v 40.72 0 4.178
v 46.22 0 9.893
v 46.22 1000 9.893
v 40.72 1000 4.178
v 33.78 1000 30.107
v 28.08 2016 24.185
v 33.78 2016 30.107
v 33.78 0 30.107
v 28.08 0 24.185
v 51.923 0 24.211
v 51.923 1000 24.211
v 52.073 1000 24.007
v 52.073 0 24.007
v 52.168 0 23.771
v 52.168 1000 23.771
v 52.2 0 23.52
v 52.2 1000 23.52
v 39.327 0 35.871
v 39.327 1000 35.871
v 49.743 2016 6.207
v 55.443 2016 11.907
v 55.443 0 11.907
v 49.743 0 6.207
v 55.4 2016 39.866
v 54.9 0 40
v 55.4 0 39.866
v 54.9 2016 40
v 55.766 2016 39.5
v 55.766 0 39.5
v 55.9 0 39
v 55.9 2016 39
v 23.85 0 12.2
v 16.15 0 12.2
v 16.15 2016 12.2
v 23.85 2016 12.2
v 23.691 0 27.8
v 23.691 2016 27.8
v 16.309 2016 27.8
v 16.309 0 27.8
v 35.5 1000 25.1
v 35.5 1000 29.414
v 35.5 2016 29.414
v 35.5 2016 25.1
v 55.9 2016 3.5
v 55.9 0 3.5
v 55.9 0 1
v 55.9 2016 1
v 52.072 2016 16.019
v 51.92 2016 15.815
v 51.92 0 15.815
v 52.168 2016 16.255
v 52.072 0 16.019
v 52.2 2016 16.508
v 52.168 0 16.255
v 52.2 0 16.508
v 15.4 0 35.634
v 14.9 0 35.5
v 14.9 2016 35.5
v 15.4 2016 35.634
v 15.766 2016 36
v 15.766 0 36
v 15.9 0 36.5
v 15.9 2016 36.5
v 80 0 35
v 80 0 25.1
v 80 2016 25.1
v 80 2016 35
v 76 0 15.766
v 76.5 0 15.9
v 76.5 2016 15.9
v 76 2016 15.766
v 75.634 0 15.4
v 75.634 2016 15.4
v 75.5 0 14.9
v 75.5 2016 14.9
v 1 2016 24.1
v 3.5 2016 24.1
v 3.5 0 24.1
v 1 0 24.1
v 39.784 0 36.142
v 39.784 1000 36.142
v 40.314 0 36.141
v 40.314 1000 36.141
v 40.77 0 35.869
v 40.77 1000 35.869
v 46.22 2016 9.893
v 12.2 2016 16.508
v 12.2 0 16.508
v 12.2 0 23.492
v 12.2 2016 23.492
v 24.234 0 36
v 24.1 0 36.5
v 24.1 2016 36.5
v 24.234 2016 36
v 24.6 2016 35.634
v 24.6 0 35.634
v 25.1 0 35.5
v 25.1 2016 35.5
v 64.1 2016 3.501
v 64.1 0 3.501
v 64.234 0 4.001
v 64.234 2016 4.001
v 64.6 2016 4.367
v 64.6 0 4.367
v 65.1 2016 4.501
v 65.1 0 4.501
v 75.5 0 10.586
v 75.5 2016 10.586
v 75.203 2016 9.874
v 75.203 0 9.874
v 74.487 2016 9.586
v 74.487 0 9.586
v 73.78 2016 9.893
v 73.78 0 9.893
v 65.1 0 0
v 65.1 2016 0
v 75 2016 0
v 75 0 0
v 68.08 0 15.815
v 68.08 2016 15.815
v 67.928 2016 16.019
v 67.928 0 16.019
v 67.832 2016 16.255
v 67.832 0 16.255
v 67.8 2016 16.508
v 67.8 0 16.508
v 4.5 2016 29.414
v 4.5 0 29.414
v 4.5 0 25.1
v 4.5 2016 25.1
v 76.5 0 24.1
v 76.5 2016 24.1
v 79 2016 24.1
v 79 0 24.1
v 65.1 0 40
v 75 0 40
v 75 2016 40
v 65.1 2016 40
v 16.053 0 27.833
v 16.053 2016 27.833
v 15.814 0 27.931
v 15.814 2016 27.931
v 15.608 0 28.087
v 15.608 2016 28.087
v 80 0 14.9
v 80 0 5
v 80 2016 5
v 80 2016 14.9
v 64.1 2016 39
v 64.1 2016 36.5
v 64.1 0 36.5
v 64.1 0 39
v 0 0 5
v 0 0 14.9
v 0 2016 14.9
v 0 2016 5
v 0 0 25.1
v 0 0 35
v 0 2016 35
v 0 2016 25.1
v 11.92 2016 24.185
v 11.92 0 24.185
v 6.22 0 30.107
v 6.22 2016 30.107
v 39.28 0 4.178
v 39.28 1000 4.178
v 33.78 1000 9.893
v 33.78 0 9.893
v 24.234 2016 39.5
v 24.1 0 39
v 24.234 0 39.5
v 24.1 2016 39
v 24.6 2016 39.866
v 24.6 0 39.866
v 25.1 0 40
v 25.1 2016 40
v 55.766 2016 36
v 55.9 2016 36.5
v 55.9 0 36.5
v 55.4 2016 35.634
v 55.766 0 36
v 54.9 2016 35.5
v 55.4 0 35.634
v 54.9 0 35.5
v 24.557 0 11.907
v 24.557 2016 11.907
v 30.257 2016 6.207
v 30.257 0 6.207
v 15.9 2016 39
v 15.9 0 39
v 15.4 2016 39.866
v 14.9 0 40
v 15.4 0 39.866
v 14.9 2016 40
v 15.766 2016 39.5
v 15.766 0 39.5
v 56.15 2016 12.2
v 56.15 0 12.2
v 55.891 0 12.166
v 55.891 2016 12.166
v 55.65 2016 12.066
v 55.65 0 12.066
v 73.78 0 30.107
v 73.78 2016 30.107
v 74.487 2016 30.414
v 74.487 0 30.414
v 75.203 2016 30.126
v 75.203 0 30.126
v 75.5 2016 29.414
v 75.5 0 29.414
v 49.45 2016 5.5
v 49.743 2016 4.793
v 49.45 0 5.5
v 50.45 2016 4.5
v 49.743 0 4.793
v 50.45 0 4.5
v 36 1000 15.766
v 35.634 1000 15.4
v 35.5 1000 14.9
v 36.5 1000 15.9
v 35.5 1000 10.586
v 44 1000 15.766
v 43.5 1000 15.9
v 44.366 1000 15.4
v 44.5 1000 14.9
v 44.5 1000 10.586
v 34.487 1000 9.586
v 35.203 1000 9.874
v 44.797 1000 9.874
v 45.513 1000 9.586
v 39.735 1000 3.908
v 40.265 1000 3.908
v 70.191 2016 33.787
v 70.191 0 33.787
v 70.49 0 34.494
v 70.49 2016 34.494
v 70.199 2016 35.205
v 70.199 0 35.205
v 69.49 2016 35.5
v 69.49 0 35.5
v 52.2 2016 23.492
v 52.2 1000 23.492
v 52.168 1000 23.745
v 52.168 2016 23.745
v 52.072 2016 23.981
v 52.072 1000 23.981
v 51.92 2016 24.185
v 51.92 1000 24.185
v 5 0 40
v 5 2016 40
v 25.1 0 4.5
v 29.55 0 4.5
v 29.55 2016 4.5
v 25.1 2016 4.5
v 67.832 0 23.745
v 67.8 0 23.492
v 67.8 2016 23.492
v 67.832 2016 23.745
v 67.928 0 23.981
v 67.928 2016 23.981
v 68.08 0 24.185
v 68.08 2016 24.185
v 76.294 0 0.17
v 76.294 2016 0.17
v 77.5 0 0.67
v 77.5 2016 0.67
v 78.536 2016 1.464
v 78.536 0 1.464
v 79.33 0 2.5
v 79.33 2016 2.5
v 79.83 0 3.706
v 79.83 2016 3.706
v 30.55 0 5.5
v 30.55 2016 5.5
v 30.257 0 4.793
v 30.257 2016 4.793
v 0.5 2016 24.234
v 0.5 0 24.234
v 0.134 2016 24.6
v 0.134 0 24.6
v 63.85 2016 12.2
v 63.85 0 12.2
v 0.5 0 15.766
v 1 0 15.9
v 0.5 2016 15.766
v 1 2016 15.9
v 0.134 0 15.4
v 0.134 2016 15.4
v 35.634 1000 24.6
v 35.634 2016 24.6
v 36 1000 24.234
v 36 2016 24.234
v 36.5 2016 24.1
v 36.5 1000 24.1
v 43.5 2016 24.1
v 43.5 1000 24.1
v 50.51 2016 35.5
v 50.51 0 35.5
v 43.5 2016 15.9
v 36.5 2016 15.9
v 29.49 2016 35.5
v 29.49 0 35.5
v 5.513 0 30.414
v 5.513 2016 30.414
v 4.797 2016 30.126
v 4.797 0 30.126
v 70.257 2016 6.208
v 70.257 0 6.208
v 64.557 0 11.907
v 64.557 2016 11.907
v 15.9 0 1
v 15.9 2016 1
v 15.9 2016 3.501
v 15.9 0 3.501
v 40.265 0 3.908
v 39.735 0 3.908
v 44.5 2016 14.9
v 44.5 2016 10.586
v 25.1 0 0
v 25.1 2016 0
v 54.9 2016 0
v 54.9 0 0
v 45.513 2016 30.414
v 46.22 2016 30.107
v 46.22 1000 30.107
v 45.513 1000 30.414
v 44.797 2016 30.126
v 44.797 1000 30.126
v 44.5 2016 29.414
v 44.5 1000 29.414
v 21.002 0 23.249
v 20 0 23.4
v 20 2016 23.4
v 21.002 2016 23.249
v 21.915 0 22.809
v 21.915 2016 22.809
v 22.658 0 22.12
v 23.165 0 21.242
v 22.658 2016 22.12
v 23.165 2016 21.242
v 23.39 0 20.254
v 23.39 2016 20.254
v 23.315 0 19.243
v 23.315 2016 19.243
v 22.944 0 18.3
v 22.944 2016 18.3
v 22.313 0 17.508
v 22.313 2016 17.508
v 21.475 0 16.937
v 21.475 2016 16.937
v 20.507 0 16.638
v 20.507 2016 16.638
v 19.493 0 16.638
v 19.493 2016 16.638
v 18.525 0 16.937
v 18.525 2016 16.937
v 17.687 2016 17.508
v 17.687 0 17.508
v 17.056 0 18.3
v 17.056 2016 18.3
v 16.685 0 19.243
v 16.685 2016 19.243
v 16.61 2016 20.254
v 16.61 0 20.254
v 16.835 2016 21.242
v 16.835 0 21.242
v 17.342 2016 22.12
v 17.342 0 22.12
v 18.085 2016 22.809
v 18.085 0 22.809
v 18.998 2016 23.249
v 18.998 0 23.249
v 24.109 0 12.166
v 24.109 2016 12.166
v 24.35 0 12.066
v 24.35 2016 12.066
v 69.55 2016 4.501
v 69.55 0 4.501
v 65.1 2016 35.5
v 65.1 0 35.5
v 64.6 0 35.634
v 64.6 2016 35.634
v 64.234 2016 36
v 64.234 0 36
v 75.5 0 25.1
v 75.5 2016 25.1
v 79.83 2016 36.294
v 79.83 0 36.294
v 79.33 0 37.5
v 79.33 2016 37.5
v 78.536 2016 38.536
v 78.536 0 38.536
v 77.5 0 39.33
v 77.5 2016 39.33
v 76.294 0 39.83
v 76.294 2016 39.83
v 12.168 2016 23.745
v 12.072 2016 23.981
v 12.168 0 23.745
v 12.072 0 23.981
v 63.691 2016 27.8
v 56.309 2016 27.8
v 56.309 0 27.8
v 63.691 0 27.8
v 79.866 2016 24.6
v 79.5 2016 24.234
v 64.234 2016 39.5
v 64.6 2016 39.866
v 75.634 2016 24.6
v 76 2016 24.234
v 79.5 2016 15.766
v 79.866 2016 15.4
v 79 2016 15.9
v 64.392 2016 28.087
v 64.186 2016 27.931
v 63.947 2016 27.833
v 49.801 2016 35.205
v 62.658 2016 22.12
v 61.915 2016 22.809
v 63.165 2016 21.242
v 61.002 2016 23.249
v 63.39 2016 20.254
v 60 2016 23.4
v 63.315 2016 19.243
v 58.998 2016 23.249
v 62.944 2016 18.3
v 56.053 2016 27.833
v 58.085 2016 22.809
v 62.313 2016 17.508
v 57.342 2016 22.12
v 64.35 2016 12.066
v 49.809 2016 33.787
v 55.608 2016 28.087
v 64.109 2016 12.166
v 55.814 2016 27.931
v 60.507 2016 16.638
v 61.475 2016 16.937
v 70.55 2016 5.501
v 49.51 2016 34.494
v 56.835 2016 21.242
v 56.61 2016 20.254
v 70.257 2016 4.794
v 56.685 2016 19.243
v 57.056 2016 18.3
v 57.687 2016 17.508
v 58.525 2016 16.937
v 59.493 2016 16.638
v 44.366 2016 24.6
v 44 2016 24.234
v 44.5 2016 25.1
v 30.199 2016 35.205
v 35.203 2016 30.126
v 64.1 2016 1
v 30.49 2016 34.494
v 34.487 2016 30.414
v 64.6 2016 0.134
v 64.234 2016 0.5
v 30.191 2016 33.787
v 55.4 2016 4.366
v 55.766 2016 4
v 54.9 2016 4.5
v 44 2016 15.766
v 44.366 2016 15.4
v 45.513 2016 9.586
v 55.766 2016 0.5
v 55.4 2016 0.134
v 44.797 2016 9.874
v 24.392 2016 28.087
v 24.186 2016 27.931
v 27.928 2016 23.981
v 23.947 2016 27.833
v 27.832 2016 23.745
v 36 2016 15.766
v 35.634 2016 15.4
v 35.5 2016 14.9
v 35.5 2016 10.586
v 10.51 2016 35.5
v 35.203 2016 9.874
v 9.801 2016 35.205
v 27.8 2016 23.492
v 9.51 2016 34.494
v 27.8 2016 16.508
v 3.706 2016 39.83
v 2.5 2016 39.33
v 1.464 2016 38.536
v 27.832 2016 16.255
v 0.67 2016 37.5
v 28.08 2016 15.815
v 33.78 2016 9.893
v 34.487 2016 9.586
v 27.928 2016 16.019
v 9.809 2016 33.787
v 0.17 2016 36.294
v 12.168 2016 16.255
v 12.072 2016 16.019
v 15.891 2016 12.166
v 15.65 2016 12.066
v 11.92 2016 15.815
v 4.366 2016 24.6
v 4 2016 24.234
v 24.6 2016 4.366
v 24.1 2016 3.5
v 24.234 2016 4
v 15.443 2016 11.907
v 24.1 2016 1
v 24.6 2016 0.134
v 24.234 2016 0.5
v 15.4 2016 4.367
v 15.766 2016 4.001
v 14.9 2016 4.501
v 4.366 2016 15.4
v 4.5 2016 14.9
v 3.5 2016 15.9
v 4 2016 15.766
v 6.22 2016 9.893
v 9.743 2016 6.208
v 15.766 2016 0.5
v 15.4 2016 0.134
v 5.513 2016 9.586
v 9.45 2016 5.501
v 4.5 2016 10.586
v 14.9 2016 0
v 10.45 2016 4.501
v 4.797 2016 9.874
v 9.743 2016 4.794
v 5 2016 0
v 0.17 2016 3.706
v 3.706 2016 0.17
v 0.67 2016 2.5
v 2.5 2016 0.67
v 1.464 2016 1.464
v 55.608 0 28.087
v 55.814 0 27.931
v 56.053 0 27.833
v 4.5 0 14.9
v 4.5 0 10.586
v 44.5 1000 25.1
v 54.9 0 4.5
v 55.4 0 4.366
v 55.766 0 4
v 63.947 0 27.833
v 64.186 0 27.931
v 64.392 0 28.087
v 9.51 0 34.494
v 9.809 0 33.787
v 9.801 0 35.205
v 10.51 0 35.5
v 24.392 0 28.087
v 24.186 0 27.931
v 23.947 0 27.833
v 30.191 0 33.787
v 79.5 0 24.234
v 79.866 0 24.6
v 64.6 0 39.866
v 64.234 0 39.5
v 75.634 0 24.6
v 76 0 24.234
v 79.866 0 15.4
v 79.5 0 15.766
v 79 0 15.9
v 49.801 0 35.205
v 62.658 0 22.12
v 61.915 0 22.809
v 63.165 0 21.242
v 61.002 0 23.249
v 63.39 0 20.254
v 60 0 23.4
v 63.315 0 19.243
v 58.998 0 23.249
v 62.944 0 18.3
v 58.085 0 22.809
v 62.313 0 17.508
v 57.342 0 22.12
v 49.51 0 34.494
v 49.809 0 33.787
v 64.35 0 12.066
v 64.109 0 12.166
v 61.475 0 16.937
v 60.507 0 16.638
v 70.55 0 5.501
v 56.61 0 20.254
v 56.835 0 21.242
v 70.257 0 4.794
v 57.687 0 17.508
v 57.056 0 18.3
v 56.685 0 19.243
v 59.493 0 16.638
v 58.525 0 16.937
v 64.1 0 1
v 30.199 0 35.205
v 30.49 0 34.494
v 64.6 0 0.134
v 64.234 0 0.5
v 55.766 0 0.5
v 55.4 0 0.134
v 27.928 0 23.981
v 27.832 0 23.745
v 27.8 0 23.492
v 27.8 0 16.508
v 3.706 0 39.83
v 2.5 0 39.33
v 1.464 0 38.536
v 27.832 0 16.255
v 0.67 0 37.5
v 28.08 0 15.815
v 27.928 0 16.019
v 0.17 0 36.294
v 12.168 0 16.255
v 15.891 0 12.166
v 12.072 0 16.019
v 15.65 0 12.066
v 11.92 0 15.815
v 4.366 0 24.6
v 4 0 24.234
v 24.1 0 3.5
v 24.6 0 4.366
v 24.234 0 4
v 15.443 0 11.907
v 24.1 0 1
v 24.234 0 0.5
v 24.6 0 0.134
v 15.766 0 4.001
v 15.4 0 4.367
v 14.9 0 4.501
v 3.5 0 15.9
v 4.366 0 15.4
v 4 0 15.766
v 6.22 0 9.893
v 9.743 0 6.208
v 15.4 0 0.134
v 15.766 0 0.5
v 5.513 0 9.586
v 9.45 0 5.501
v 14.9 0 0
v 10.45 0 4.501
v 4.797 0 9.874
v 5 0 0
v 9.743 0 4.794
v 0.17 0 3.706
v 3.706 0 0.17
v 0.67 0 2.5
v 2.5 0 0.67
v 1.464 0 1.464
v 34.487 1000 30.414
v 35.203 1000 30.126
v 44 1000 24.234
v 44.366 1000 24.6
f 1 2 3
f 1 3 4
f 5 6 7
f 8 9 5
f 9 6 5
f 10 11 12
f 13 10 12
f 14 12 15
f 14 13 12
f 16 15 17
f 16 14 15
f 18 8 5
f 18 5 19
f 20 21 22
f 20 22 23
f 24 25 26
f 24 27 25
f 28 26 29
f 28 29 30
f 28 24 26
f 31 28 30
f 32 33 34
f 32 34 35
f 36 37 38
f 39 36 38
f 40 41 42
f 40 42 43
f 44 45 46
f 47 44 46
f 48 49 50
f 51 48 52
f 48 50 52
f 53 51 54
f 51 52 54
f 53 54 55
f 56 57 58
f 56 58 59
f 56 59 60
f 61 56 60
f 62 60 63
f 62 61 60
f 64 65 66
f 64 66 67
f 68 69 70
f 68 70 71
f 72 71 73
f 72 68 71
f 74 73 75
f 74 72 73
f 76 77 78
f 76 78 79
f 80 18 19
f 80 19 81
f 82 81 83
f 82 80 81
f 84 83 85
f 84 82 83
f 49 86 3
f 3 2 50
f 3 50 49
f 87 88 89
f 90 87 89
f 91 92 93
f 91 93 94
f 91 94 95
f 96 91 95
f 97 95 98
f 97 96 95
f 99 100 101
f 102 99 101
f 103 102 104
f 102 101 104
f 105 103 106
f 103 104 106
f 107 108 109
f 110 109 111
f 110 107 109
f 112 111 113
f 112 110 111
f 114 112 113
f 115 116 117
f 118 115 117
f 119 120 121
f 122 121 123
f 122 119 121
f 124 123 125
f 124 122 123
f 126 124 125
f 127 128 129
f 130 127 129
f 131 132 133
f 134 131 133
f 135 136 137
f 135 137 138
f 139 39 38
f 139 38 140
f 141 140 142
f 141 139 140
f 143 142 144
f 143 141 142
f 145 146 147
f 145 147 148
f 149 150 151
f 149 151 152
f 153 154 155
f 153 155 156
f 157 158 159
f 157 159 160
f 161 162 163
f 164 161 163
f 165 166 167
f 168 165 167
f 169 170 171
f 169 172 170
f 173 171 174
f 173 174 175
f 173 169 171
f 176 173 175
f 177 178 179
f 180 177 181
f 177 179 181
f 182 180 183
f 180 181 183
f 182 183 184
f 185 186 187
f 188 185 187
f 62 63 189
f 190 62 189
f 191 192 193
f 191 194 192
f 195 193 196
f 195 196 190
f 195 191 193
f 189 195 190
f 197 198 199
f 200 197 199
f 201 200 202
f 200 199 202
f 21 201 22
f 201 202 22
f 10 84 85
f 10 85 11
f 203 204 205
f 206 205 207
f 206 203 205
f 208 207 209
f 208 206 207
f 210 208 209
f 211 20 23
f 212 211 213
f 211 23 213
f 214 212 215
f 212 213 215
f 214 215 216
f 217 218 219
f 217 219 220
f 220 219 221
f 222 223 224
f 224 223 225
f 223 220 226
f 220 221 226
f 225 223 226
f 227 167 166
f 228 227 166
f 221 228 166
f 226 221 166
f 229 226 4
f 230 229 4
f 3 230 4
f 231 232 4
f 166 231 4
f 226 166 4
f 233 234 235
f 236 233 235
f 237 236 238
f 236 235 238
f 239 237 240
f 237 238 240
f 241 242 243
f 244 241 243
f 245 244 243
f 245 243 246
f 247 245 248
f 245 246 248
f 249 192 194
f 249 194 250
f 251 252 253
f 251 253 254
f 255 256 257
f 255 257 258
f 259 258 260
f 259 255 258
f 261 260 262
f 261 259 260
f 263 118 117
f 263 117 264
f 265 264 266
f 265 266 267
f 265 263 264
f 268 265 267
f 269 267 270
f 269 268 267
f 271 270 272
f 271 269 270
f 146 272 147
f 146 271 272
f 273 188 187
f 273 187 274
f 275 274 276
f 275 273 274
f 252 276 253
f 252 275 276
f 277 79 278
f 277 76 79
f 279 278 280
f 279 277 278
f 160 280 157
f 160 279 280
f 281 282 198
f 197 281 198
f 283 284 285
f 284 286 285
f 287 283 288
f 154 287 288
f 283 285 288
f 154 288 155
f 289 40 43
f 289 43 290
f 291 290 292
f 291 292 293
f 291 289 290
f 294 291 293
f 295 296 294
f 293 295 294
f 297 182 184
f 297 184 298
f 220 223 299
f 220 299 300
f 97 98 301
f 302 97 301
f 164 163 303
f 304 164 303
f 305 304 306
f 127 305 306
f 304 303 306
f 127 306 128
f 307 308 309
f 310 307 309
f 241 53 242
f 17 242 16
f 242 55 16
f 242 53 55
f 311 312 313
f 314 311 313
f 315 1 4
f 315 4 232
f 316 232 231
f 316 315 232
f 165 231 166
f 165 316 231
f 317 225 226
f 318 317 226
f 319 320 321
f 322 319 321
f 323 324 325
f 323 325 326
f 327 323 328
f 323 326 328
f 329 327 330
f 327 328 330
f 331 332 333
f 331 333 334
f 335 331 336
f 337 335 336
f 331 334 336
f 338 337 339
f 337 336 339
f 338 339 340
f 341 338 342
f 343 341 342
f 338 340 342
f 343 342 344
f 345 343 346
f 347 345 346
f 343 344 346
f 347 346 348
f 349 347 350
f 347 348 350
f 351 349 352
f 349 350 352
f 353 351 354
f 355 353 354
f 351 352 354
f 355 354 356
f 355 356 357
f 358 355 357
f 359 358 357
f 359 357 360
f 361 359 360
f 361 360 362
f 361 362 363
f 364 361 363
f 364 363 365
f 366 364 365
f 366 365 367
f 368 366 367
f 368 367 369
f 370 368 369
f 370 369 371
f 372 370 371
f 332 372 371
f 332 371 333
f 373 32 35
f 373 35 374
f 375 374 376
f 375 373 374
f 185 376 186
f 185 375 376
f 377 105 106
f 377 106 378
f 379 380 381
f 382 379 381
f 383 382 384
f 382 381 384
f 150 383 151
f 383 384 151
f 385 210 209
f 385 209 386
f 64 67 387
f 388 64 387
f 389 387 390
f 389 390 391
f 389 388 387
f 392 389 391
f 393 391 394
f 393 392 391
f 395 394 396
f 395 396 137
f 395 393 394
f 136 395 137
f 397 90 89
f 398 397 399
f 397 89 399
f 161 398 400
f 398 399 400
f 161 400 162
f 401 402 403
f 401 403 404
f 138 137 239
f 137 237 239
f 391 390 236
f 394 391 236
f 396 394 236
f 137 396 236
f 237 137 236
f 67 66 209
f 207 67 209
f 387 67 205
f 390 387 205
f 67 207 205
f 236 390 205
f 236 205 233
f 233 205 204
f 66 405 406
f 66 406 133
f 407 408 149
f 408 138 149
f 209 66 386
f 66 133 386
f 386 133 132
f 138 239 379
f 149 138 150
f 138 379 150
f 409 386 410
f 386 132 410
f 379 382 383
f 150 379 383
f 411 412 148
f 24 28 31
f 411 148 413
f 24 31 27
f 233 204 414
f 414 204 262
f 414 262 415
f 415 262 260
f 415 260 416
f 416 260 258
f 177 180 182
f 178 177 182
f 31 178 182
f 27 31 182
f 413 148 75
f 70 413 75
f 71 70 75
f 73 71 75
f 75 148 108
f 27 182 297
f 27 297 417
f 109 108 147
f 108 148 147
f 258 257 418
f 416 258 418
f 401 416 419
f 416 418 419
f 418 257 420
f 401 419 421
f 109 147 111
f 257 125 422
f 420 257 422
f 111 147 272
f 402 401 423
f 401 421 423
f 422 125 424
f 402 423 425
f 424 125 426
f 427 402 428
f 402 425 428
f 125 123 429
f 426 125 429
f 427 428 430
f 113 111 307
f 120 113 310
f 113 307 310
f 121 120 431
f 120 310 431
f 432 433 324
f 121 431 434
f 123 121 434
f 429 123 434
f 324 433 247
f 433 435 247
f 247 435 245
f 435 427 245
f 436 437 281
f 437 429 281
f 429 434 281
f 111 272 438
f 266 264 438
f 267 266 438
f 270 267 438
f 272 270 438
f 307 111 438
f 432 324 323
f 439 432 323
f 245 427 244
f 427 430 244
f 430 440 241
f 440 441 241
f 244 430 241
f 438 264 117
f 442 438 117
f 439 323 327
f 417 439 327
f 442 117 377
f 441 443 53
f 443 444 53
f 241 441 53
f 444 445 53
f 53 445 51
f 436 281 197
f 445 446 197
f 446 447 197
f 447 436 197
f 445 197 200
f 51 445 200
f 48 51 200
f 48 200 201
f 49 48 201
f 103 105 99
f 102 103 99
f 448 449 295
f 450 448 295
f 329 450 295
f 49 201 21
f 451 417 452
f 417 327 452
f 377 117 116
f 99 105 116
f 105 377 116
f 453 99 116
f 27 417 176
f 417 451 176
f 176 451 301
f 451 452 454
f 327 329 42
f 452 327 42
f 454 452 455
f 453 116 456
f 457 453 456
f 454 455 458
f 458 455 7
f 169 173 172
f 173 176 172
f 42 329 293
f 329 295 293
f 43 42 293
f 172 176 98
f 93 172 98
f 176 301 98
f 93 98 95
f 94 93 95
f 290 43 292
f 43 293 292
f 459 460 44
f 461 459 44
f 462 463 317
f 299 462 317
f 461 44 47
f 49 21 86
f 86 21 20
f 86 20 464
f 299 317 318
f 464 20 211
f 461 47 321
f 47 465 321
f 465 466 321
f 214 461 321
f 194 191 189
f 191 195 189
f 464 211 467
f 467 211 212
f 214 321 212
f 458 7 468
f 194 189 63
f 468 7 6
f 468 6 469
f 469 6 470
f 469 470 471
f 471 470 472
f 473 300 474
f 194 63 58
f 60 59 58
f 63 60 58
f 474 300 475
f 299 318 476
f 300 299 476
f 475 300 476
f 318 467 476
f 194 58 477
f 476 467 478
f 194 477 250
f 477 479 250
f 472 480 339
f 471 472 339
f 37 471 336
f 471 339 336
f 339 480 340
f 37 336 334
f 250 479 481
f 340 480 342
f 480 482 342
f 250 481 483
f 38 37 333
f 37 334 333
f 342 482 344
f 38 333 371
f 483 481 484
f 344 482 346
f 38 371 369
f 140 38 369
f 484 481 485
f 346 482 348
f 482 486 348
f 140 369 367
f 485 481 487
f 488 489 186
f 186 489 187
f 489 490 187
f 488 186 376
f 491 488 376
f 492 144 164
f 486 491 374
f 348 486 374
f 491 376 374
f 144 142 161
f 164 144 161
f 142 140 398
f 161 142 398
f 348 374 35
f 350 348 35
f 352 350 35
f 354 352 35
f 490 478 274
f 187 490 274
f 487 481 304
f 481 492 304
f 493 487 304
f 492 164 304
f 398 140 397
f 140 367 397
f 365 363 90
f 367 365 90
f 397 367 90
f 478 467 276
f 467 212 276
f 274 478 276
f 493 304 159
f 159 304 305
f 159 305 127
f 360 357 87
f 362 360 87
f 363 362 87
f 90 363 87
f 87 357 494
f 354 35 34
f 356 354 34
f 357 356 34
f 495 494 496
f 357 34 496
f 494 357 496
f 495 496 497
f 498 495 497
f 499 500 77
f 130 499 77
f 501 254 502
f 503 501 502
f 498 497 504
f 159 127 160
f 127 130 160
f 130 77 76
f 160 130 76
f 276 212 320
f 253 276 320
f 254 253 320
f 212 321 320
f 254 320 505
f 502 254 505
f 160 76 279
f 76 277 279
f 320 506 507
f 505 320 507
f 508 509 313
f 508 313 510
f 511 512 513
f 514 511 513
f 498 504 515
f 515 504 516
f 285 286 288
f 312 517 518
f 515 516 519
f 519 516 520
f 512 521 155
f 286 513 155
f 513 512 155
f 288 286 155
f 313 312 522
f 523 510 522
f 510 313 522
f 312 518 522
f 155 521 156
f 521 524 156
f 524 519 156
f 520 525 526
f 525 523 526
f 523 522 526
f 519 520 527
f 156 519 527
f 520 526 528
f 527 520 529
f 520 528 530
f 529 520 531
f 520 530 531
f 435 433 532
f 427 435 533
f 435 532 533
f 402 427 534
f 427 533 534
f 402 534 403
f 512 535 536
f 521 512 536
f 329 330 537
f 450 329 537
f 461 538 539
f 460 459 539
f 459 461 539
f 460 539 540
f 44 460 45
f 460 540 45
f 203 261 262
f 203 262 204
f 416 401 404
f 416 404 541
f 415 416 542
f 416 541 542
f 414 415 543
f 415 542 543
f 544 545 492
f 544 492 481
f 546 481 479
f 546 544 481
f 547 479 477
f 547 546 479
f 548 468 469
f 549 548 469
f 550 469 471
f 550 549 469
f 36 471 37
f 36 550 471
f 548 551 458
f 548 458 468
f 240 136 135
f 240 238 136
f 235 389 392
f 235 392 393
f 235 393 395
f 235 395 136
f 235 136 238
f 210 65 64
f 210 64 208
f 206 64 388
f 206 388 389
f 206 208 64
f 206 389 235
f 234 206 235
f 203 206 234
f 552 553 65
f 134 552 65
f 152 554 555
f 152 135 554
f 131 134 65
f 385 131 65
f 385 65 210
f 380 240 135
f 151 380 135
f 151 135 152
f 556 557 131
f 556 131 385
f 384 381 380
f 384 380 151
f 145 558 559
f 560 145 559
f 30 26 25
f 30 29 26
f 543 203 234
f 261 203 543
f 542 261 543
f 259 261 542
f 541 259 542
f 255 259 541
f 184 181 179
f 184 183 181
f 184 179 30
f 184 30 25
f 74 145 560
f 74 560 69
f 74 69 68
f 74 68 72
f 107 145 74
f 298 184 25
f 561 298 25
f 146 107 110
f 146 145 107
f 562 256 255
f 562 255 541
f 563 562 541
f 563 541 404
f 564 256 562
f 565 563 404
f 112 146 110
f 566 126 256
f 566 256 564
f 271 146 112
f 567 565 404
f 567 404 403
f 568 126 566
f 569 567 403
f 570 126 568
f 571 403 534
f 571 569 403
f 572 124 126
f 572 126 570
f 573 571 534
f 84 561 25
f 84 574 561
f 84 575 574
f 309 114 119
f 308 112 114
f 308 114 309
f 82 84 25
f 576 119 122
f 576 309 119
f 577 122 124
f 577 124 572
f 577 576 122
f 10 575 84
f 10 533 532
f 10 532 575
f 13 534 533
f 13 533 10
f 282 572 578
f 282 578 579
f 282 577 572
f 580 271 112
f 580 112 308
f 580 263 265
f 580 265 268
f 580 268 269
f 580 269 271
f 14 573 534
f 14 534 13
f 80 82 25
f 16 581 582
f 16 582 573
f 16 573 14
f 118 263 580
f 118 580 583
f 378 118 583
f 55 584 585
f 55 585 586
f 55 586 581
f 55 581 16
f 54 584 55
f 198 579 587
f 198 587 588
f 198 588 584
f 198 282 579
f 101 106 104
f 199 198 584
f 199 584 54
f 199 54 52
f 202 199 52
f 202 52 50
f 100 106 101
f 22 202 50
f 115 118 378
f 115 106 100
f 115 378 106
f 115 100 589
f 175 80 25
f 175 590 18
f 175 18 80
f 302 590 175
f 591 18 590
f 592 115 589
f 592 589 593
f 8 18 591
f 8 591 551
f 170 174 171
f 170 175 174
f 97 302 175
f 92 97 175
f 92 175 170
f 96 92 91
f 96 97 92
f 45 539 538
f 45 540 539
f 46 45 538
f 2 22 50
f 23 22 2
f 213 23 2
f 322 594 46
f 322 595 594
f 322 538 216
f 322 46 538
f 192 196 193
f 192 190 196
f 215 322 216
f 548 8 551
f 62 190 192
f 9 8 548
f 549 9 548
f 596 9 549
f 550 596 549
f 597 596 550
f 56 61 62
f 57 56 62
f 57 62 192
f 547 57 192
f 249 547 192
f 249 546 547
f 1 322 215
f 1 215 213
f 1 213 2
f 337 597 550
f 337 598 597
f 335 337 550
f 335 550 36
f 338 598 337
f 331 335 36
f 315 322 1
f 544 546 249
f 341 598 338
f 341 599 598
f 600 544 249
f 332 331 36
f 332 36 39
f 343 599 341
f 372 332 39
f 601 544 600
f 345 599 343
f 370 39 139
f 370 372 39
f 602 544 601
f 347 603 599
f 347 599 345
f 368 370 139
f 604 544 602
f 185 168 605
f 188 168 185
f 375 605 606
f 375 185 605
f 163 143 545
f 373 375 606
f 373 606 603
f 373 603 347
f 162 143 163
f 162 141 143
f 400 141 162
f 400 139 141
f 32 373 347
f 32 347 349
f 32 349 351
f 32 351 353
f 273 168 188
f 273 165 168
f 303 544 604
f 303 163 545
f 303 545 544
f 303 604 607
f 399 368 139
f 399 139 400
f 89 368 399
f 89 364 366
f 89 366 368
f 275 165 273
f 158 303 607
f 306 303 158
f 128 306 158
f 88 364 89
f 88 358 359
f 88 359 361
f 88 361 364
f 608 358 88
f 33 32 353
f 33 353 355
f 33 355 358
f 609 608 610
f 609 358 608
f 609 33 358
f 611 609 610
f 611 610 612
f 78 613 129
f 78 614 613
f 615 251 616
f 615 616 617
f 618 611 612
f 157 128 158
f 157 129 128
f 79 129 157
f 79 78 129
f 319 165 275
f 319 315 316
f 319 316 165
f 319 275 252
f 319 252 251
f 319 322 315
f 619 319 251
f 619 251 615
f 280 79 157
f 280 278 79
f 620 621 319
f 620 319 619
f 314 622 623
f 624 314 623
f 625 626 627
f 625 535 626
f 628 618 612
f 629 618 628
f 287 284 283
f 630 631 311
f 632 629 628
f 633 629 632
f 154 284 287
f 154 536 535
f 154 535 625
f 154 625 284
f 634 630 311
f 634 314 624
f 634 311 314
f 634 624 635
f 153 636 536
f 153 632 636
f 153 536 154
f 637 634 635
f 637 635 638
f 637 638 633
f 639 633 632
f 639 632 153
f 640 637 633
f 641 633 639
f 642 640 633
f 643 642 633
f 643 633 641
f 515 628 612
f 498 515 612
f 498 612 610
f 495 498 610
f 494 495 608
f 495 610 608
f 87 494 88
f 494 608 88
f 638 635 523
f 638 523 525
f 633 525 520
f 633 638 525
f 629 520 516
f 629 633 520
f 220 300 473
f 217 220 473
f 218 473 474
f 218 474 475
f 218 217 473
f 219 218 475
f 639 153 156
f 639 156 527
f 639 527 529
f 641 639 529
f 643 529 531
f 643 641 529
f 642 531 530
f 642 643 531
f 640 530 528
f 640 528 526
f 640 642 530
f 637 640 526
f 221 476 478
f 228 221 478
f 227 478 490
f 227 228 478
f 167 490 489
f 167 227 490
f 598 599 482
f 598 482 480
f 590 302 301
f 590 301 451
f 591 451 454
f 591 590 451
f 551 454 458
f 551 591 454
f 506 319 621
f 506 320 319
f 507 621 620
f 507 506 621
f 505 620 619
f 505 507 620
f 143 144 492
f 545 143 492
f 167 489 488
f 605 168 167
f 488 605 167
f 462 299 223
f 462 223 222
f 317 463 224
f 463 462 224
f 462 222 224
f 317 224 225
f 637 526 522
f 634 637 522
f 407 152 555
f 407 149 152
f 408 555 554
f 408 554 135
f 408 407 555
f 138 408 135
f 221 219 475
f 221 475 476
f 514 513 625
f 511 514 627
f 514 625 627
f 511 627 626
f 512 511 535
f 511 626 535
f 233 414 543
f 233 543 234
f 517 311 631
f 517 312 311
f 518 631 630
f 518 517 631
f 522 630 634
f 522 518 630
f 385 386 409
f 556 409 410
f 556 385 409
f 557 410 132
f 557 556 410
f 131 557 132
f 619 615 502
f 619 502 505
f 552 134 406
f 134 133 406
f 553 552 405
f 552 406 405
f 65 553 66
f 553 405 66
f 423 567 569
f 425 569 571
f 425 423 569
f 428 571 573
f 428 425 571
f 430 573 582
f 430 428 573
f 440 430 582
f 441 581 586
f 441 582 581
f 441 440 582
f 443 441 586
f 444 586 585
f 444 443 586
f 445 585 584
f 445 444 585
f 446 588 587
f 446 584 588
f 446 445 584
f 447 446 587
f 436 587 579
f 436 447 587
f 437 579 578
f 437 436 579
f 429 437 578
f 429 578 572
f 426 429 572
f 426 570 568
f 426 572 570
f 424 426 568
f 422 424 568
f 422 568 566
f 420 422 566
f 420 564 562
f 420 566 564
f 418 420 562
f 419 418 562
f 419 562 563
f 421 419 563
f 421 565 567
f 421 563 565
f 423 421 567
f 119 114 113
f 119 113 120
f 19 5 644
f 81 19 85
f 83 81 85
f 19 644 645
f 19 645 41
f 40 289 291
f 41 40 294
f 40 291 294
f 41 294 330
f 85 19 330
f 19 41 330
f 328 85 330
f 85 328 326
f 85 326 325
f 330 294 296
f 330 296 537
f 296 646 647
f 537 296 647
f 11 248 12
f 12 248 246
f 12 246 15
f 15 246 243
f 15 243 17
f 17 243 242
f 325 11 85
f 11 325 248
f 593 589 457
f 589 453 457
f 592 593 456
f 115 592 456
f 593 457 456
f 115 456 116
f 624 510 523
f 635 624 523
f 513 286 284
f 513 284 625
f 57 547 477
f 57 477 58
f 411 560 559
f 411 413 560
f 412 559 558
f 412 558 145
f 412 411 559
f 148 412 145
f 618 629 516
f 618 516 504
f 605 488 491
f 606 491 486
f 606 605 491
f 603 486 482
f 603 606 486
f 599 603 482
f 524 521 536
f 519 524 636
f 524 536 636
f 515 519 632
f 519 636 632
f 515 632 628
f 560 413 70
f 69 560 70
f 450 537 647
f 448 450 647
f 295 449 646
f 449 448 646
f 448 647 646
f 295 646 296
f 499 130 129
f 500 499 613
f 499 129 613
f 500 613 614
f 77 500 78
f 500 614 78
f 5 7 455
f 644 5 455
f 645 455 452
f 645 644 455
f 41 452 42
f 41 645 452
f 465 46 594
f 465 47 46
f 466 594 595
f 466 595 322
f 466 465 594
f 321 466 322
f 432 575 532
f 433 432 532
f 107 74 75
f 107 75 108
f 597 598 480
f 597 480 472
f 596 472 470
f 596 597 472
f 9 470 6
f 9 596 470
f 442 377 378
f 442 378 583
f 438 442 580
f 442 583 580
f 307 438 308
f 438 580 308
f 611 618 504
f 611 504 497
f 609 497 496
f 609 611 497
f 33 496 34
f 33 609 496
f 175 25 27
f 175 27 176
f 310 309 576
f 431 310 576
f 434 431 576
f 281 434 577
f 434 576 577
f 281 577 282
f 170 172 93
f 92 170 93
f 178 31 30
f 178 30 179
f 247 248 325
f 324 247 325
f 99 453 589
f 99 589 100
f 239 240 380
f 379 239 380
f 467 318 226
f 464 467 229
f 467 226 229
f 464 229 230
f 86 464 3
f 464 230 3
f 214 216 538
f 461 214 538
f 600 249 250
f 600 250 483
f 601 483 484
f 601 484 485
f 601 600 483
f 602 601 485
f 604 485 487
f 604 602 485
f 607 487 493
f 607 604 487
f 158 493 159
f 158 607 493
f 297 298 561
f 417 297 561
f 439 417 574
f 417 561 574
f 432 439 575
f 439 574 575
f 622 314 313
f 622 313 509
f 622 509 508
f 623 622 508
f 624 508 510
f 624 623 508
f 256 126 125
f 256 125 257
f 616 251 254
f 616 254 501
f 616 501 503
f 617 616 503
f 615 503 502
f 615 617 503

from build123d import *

# Parameters (mm, degrees)
BOSS_EXTRUDE1_DEPTH   = 2016
SKETCH3_R             = 3.4
CUT_EXTRUDE1_DEPTH    = 2018.983151565
CUT_EXTRUDE2_DEPTH    = 2018.983151565
FILLET1_R             = 1
FILLET2_R             = 1
FILLET3_R             = 1
CUT_EXTRUDE3_DEPTH    = 2018.983151565
CUT_EXTRUDE4_DEPTH    = 2018.983151565
FILLET4_R             = 1
FILLET5_R             = 1
FILLET6_R             = 1
FILLET7_R             = 1
FILLET8_R             = 1
FILLET9_R             = 1
FILLET10_R            = 1
FILLET11_R            = 1
MIRROR11_COPY_1_DEPTH = 2018.983151565
MIRROR11_COPY_2_DEPTH = 2018.983151565
CUT_EXTRUDE5_DEPTH    = 1000


with BuildPart() as part:
    # Sketch1 → Boss-Extrude1 (new body)
    with BuildSketch(Plane(origin=(0, 0, 0), x_dir=(1, 0, 0), z_dir=(0, 1, 0))):
        with BuildLine():
            Line((5, 0), (75, 0))
            ThreePointArc((75, 0), (78.535533906, -1.464466094), (80, -5))
            Line((80, -5), (80, -35))
            ThreePointArc((80, -35), (78.535533906, -38.535533906), (75, -40))
            Line((75, -40), (5, -40))
            ThreePointArc((5, -40), (1.464466094, -38.535533906), (0, -35))
            Line((0, -35), (0, -5))
            ThreePointArc((0, -5), (1.464466094, -1.464466094), (5, 0))
        make_face()
    extrude(amount=BOSS_EXTRUDE1_DEPTH)

    # Sketch3 → Cut-Extrude1 (cut, through all)
    with BuildSketch(Plane(origin=(0, 2016, 0), x_dir=(1, 0, 0), z_dir=(0, 1, 0))):
        with Locations(Location((20, -20, 0), (0, 0, 270))):
            Circle(SKETCH3_R)
    cut_extrude1 = extrude(amount=-CUT_EXTRUDE1_DEPTH, mode=Mode.SUBTRACT)

    # Mirror3: Cut-Extrude1 across plane
    add(cut_extrude1.mirror(Plane(origin=(40, 0, 0), x_dir=(0, 0, 1), z_dir=(1, 0, 0))), mode=Mode.SUBTRACT)

    # Sketch7 → Cut-Extrude2 (cut, through all)
    with BuildSketch(Plane(origin=(0, 0, 0), x_dir=(-1, 0, 0), z_dir=(0, -1, 0))):
        with BuildLine():
            Line((-15.9, -40), (-24.1, -40))
            Line((-24.1, -40), (-24.1, -36.5))
            ThreePointArc((-24.1, -36.5), (-24.392893219, -35.792893219), (-25.1, -35.5))
            Line((-25.1, -35.5), (-29.489753594, -35.5))
            ThreePointArc((-29.489753594, -35.5), (-30.415270825, -34.8787055), (-30.190750526, -33.786835712))
            Line((-30.190750526, -33.786835712), (-24.391814382, -28.086835712))
            ThreePointArc((-24.391814382, -28.086835712), (-24.069522951, -27.874482769), (-23.69081745, -27.8))
            Line((-23.69081745, -27.8), (-16.309186536, -27.8))
            ThreePointArc((-16.309186536, -27.8), (-15.930477876, -27.874484063), (-15.608184734, -28.086840499))
            Line((-15.608184734, -28.086840499), (-9.809327805, -33.786840499))
            ThreePointArc((-9.809327805, -33.786840499), (-9.584813669, -34.87870866), (-10.510329607, -35.5))
            Line((-10.510329607, -35.5), (-14.9, -35.5))
            ThreePointArc((-14.9, -35.5), (-15.607106781, -35.792893219), (-15.9, -36.5))
            Line((-15.9, -36.5), (-15.9, -40))
        make_face()
    cut_extrude2 = extrude(amount=-CUT_EXTRUDE2_DEPTH, mode=Mode.SUBTRACT)

    # Fillet1
    fillet1_edges = [part.edges().sort_by_distance(p)[0] for p in [
        (15.9, 1008, 40),
        (24.1, 1008, 40),
    ]]
    fillet(fillet1_edges, radius=FILLET1_R)

    # Mirror8: Cut-Extrude2 across plane
    add(cut_extrude2.mirror(Plane(origin=(40, 0, 0), x_dir=(0, 0, 1), z_dir=(1, 0, 0))), mode=Mode.SUBTRACT)

    # Fillet2
    fillet2_edges = [part.edges().sort_by_distance(p)[0] for p in [
        (55.9, 1008, 40),
    ]]
    fillet(fillet2_edges, radius=FILLET2_R)

    # Fillet3
    fillet3_edges = [part.edges().sort_by_distance(p)[0] for p in [
        (64.1, 1008, 40),
    ]]
    fillet(fillet3_edges, radius=FILLET3_R)

    # Sketch9 → Cut-Extrude3 (cut, through all)
    with BuildSketch(Plane(origin=(0, 0, 0), x_dir=(1, 0, 0), z_dir=(0, 1, 0))):
        with BuildLine():
            Line((14.899846923, -4.500713815), (10.450461284, -4.500713815))
            ThreePointArc((10.450461284, -4.500713815), (9.526581751, -5.118030383), (9.743354502, -6.207820596))
            Line((9.743354502, -6.207820596), (15.442640687, -11.907106781))
            ThreePointArc((15.442640687, -11.907106781), (15.767064036, -12.123879533), (16.149747468, -12.2))
            Line((16.149747468, -12.2), (23.850252532, -12.2))
            ThreePointArc((23.850252532, -12.2), (24.232935964, -12.123879533), (24.557359313, -11.907106781))
            Line((24.557359313, -11.907106781), (30.257359313, -6.207106781))
            ThreePointArc((30.257359313, -6.207106781), (30.474132064, -5.117316568), (29.550252532, -4.5))
            Line((29.550252532, -4.5), (25.099846964, -4.5))
            ThreePointArc((25.099846964, -4.5), (24.392724723, -4.207091321), (24.099846965, -3.499956273))
            Line((24.099846965, -3.499956273), (24.100000008, 0))
            Line((24.100000008, 0), (15.9, 0))
            Line((15.9, 0), (15.899846922, -3.500757542))
            ThreePointArc((15.899846922, -3.500757542), (15.606938244, -4.207836056), (14.899846923, -4.500713815))
        make_face()
    cut_extrude3 = extrude(amount=CUT_EXTRUDE3_DEPTH, mode=Mode.SUBTRACT)

    # Mirror9: Cut-Extrude3 across plane
    add(cut_extrude3.mirror(Plane(origin=(40, 0, 0), x_dir=(0, 0, 1), z_dir=(1, 0, 0))), mode=Mode.SUBTRACT)

    # Sketch10 → Cut-Extrude4 (cut, through all)
    with BuildSketch(Plane(origin=(0, 0, 0), x_dir=(1, 0, 0), z_dir=(0, 1, 0))):
        with BuildLine():
            Line((4.5, -14.9), (4.5, -10.58605332))
            ThreePointArc((4.5, -10.58605332), (5.126159695, -9.658560233), (6.220486853, -9.892584724))
            Line((6.220486853, -9.892584724), (11.920486853, -15.814662646))
            ThreePointArc((11.920486853, -15.814662646), (12.127493087, -16.134290938), (12.2, -16.508131242))
            Line((12.2, -16.508131242), (12.2, -23.491868758))
            ThreePointArc((12.2, -23.491868758), (12.127493087, -23.865709062), (11.920486853, -24.185337354))
            Line((11.920486853, -24.185337354), (6.220486853, -30.107415276))
            ThreePointArc((6.220486853, -30.107415276), (5.126159695, -30.341439767), (4.5, -29.41394668))
            Line((4.5, -29.41394668), (4.5, -25.1))
            ThreePointArc((4.5, -25.1), (4.207106781, -24.392893219), (3.5, -24.1))
            Line((3.5, -24.1), (0, -24.1))
            Line((0, -24.1), (0, -15.9))
            Line((0, -15.9), (3.5, -15.9))
            ThreePointArc((3.5, -15.9), (4.207106781, -15.607106781), (4.5, -14.9))
        make_face()
    cut_extrude4 = extrude(amount=CUT_EXTRUDE4_DEPTH, mode=Mode.SUBTRACT)

    # Fillet4
    fillet4_edges = [part.edges().sort_by_distance(p)[0] for p in [
        (24.100000008, 1008, 0),
    ]]
    fillet(fillet4_edges, radius=FILLET4_R)

    # Fillet5
    fillet5_edges = [part.edges().sort_by_distance(p)[0] for p in [
        (64.1, 1008, 0),
    ]]
    fillet(fillet5_edges, radius=FILLET5_R)

    # Fillet6
    fillet6_edges = [part.edges().sort_by_distance(p)[0] for p in [
        (55.899999992, 1008, 0),
    ]]
    fillet(fillet6_edges, radius=FILLET6_R)

    # Fillet7
    fillet7_edges = [part.edges().sort_by_distance(p)[0] for p in [
        (15.9, 1008, 0),
    ]]
    fillet(fillet7_edges, radius=FILLET7_R)

    # Fillet8
    fillet8_edges = [part.edges().sort_by_distance(p)[0] for p in [
        (0, 1008, 24.1),
    ]]
    fillet(fillet8_edges, radius=FILLET8_R)

    # Fillet9
    fillet9_edges = [part.edges().sort_by_distance(p)[0] for p in [
        (0, 1008, 15.9),
    ]]
    fillet(fillet9_edges, radius=FILLET9_R)

    # Mirror10: Cut-Extrude4 across plane
    add(cut_extrude4.mirror(Plane(origin=(40, 0, 0), x_dir=(0, 0, 1), z_dir=(1, 0, 0))), mode=Mode.SUBTRACT)

    # Fillet10
    fillet10_edges = [part.edges().sort_by_distance(p)[0] for p in [
        (80, 1008, 15.9),
    ]]
    fillet(fillet10_edges, radius=FILLET10_R)

    # Fillet11
    fillet11_edges = [part.edges().sort_by_distance(p)[0] for p in [
        (80, 1008, 24.1),
    ]]
    fillet(fillet11_edges, radius=FILLET11_R)

    # Mirror11 copy 1 sketch → Mirror11 copy 1 (cut, through all)
    with BuildSketch(Plane(origin=(40, 0, 0), x_dir=(1, 0, 0), z_dir=(0, 1, 0))):
        with BuildLine():
            Line((4.5, -14.9), (4.5, -10.58605332))
            ThreePointArc((4.5, -10.58605332), (5.126159695, -9.658560233), (6.220486853, -9.892584724))
            Line((6.220486853, -9.892584724), (11.920486853, -15.814662646))
            ThreePointArc((11.920486853, -15.814662646), (12.127493087, -16.134290938), (12.2, -16.508131242))
            Line((12.2, -16.508131242), (12.2, -23.491868758))
            ThreePointArc((12.2, -23.491868758), (12.127493087, -23.865709062), (11.920486853, -24.185337354))
            Line((11.920486853, -24.185337354), (6.220486853, -30.107415276))
            ThreePointArc((6.220486853, -30.107415276), (5.126159695, -30.341439767), (4.5, -29.41394668))
            Line((4.5, -29.41394668), (4.5, -25.1))
            ThreePointArc((4.5, -25.1), (4.207106781, -24.392893219), (3.5, -24.1))
            Line((3.5, -24.1), (0, -24.1))
            Line((0, -24.1), (0, -15.9))
            Line((0, -15.9), (3.5, -15.9))
            ThreePointArc((3.5, -15.9), (4.207106781, -15.607106781), (4.5, -14.9))
        make_face()
    extrude(amount=MIRROR11_COPY_1_DEPTH, mode=Mode.SUBTRACT)

    # Mirror11 copy 2 sketch → Mirror11 copy 2 (cut, through all)
    with BuildSketch(Plane(origin=(120, 0, 0), x_dir=(-1, 0, 0), z_dir=(0, 1, 0))):
        with BuildLine():
            Line((4.5, 14.9), (4.5, 10.58605332))
            ThreePointArc((4.5, 10.58605332), (5.126159695, 9.658560233), (6.220486853, 9.892584724))
            Line((6.220486853, 9.892584724), (11.920486853, 15.814662646))
            ThreePointArc((11.920486853, 15.814662646), (12.127493087, 16.134290938), (12.2, 16.508131242))
            Line((12.2, 16.508131242), (12.2, 23.491868758))
            ThreePointArc((12.2, 23.491868758), (12.127493087, 23.865709062), (11.920486853, 24.185337354))
            Line((11.920486853, 24.185337354), (6.220486853, 30.107415276))
            ThreePointArc((6.220486853, 30.107415276), (5.126159695, 30.341439767), (4.5, 29.41394668))
            Line((4.5, 29.41394668), (4.5, 25.1))
            ThreePointArc((4.5, 25.1), (4.207106781, 24.392893219), (3.5, 24.1))
            Line((3.5, 24.1), (0, 24.1))
            Line((0, 24.1), (0, 15.9))
            Line((0, 15.9), (3.5, 15.9))
            ThreePointArc((3.5, 15.9), (4.207106781, 15.607106781), (4.5, 14.9))
        make_face()
    extrude(amount=MIRROR11_COPY_2_DEPTH, mode=Mode.SUBTRACT)

    # Mirror12: Cut-Extrude4 across plane
    add(cut_extrude4.mirror(Plane.ZY.offset(-20)), mode=Mode.SUBTRACT)

    # Sketch12 → Cut-Extrude5 (cut)
    with BuildSketch(Plane(origin=(0, 0, 0), x_dir=(-1, 0, 0), z_dir=(0, -1, 0))):
        with BuildLine():
            Line((-28.079513147, -24.185337354), (-39.327067998, -35.871108628))
            ThreePointArc((-39.327067998, -35.871108628), (-40.049082116, -36.177638866), (-40.770156561, -35.868904648))
            Line((-40.770156561, -35.868904648), (-51.922601709, -24.210885791))
            ThreePointArc((-51.922601709, -24.210885791), (-52.128062958, -23.892044517), (-52.2, -23.519621175))
            Line((-52.2, -23.519621175), (-52.2, -16.508131242))
            ThreePointArc((-52.2, -16.508131242), (-52.127493087, -16.134290938), (-51.920486853, -15.814662646))
            Line((-51.920486853, -15.814662646), (-40.720486853, -4.17829901))
            ThreePointArc((-40.720486853, -4.17829901), (-40, -3.871767606), (-39.279513147, -4.17829901))
            Line((-39.279513147, -4.17829901), (-28.079513147, -15.814662646))
            ThreePointArc((-28.079513147, -15.814662646), (-27.872506913, -16.134290938), (-27.8, -16.508131242))
            Line((-27.8, -16.508131242), (-27.8, -23.491868758))
            ThreePointArc((-27.8, -23.491868758), (-27.872506913, -23.865709062), (-28.079513147, -24.185337354))
        make_face()
    extrude(amount=-CUT_EXTRUDE5_DEPTH, mode=Mode.SUBTRACT)


solid = part.part
